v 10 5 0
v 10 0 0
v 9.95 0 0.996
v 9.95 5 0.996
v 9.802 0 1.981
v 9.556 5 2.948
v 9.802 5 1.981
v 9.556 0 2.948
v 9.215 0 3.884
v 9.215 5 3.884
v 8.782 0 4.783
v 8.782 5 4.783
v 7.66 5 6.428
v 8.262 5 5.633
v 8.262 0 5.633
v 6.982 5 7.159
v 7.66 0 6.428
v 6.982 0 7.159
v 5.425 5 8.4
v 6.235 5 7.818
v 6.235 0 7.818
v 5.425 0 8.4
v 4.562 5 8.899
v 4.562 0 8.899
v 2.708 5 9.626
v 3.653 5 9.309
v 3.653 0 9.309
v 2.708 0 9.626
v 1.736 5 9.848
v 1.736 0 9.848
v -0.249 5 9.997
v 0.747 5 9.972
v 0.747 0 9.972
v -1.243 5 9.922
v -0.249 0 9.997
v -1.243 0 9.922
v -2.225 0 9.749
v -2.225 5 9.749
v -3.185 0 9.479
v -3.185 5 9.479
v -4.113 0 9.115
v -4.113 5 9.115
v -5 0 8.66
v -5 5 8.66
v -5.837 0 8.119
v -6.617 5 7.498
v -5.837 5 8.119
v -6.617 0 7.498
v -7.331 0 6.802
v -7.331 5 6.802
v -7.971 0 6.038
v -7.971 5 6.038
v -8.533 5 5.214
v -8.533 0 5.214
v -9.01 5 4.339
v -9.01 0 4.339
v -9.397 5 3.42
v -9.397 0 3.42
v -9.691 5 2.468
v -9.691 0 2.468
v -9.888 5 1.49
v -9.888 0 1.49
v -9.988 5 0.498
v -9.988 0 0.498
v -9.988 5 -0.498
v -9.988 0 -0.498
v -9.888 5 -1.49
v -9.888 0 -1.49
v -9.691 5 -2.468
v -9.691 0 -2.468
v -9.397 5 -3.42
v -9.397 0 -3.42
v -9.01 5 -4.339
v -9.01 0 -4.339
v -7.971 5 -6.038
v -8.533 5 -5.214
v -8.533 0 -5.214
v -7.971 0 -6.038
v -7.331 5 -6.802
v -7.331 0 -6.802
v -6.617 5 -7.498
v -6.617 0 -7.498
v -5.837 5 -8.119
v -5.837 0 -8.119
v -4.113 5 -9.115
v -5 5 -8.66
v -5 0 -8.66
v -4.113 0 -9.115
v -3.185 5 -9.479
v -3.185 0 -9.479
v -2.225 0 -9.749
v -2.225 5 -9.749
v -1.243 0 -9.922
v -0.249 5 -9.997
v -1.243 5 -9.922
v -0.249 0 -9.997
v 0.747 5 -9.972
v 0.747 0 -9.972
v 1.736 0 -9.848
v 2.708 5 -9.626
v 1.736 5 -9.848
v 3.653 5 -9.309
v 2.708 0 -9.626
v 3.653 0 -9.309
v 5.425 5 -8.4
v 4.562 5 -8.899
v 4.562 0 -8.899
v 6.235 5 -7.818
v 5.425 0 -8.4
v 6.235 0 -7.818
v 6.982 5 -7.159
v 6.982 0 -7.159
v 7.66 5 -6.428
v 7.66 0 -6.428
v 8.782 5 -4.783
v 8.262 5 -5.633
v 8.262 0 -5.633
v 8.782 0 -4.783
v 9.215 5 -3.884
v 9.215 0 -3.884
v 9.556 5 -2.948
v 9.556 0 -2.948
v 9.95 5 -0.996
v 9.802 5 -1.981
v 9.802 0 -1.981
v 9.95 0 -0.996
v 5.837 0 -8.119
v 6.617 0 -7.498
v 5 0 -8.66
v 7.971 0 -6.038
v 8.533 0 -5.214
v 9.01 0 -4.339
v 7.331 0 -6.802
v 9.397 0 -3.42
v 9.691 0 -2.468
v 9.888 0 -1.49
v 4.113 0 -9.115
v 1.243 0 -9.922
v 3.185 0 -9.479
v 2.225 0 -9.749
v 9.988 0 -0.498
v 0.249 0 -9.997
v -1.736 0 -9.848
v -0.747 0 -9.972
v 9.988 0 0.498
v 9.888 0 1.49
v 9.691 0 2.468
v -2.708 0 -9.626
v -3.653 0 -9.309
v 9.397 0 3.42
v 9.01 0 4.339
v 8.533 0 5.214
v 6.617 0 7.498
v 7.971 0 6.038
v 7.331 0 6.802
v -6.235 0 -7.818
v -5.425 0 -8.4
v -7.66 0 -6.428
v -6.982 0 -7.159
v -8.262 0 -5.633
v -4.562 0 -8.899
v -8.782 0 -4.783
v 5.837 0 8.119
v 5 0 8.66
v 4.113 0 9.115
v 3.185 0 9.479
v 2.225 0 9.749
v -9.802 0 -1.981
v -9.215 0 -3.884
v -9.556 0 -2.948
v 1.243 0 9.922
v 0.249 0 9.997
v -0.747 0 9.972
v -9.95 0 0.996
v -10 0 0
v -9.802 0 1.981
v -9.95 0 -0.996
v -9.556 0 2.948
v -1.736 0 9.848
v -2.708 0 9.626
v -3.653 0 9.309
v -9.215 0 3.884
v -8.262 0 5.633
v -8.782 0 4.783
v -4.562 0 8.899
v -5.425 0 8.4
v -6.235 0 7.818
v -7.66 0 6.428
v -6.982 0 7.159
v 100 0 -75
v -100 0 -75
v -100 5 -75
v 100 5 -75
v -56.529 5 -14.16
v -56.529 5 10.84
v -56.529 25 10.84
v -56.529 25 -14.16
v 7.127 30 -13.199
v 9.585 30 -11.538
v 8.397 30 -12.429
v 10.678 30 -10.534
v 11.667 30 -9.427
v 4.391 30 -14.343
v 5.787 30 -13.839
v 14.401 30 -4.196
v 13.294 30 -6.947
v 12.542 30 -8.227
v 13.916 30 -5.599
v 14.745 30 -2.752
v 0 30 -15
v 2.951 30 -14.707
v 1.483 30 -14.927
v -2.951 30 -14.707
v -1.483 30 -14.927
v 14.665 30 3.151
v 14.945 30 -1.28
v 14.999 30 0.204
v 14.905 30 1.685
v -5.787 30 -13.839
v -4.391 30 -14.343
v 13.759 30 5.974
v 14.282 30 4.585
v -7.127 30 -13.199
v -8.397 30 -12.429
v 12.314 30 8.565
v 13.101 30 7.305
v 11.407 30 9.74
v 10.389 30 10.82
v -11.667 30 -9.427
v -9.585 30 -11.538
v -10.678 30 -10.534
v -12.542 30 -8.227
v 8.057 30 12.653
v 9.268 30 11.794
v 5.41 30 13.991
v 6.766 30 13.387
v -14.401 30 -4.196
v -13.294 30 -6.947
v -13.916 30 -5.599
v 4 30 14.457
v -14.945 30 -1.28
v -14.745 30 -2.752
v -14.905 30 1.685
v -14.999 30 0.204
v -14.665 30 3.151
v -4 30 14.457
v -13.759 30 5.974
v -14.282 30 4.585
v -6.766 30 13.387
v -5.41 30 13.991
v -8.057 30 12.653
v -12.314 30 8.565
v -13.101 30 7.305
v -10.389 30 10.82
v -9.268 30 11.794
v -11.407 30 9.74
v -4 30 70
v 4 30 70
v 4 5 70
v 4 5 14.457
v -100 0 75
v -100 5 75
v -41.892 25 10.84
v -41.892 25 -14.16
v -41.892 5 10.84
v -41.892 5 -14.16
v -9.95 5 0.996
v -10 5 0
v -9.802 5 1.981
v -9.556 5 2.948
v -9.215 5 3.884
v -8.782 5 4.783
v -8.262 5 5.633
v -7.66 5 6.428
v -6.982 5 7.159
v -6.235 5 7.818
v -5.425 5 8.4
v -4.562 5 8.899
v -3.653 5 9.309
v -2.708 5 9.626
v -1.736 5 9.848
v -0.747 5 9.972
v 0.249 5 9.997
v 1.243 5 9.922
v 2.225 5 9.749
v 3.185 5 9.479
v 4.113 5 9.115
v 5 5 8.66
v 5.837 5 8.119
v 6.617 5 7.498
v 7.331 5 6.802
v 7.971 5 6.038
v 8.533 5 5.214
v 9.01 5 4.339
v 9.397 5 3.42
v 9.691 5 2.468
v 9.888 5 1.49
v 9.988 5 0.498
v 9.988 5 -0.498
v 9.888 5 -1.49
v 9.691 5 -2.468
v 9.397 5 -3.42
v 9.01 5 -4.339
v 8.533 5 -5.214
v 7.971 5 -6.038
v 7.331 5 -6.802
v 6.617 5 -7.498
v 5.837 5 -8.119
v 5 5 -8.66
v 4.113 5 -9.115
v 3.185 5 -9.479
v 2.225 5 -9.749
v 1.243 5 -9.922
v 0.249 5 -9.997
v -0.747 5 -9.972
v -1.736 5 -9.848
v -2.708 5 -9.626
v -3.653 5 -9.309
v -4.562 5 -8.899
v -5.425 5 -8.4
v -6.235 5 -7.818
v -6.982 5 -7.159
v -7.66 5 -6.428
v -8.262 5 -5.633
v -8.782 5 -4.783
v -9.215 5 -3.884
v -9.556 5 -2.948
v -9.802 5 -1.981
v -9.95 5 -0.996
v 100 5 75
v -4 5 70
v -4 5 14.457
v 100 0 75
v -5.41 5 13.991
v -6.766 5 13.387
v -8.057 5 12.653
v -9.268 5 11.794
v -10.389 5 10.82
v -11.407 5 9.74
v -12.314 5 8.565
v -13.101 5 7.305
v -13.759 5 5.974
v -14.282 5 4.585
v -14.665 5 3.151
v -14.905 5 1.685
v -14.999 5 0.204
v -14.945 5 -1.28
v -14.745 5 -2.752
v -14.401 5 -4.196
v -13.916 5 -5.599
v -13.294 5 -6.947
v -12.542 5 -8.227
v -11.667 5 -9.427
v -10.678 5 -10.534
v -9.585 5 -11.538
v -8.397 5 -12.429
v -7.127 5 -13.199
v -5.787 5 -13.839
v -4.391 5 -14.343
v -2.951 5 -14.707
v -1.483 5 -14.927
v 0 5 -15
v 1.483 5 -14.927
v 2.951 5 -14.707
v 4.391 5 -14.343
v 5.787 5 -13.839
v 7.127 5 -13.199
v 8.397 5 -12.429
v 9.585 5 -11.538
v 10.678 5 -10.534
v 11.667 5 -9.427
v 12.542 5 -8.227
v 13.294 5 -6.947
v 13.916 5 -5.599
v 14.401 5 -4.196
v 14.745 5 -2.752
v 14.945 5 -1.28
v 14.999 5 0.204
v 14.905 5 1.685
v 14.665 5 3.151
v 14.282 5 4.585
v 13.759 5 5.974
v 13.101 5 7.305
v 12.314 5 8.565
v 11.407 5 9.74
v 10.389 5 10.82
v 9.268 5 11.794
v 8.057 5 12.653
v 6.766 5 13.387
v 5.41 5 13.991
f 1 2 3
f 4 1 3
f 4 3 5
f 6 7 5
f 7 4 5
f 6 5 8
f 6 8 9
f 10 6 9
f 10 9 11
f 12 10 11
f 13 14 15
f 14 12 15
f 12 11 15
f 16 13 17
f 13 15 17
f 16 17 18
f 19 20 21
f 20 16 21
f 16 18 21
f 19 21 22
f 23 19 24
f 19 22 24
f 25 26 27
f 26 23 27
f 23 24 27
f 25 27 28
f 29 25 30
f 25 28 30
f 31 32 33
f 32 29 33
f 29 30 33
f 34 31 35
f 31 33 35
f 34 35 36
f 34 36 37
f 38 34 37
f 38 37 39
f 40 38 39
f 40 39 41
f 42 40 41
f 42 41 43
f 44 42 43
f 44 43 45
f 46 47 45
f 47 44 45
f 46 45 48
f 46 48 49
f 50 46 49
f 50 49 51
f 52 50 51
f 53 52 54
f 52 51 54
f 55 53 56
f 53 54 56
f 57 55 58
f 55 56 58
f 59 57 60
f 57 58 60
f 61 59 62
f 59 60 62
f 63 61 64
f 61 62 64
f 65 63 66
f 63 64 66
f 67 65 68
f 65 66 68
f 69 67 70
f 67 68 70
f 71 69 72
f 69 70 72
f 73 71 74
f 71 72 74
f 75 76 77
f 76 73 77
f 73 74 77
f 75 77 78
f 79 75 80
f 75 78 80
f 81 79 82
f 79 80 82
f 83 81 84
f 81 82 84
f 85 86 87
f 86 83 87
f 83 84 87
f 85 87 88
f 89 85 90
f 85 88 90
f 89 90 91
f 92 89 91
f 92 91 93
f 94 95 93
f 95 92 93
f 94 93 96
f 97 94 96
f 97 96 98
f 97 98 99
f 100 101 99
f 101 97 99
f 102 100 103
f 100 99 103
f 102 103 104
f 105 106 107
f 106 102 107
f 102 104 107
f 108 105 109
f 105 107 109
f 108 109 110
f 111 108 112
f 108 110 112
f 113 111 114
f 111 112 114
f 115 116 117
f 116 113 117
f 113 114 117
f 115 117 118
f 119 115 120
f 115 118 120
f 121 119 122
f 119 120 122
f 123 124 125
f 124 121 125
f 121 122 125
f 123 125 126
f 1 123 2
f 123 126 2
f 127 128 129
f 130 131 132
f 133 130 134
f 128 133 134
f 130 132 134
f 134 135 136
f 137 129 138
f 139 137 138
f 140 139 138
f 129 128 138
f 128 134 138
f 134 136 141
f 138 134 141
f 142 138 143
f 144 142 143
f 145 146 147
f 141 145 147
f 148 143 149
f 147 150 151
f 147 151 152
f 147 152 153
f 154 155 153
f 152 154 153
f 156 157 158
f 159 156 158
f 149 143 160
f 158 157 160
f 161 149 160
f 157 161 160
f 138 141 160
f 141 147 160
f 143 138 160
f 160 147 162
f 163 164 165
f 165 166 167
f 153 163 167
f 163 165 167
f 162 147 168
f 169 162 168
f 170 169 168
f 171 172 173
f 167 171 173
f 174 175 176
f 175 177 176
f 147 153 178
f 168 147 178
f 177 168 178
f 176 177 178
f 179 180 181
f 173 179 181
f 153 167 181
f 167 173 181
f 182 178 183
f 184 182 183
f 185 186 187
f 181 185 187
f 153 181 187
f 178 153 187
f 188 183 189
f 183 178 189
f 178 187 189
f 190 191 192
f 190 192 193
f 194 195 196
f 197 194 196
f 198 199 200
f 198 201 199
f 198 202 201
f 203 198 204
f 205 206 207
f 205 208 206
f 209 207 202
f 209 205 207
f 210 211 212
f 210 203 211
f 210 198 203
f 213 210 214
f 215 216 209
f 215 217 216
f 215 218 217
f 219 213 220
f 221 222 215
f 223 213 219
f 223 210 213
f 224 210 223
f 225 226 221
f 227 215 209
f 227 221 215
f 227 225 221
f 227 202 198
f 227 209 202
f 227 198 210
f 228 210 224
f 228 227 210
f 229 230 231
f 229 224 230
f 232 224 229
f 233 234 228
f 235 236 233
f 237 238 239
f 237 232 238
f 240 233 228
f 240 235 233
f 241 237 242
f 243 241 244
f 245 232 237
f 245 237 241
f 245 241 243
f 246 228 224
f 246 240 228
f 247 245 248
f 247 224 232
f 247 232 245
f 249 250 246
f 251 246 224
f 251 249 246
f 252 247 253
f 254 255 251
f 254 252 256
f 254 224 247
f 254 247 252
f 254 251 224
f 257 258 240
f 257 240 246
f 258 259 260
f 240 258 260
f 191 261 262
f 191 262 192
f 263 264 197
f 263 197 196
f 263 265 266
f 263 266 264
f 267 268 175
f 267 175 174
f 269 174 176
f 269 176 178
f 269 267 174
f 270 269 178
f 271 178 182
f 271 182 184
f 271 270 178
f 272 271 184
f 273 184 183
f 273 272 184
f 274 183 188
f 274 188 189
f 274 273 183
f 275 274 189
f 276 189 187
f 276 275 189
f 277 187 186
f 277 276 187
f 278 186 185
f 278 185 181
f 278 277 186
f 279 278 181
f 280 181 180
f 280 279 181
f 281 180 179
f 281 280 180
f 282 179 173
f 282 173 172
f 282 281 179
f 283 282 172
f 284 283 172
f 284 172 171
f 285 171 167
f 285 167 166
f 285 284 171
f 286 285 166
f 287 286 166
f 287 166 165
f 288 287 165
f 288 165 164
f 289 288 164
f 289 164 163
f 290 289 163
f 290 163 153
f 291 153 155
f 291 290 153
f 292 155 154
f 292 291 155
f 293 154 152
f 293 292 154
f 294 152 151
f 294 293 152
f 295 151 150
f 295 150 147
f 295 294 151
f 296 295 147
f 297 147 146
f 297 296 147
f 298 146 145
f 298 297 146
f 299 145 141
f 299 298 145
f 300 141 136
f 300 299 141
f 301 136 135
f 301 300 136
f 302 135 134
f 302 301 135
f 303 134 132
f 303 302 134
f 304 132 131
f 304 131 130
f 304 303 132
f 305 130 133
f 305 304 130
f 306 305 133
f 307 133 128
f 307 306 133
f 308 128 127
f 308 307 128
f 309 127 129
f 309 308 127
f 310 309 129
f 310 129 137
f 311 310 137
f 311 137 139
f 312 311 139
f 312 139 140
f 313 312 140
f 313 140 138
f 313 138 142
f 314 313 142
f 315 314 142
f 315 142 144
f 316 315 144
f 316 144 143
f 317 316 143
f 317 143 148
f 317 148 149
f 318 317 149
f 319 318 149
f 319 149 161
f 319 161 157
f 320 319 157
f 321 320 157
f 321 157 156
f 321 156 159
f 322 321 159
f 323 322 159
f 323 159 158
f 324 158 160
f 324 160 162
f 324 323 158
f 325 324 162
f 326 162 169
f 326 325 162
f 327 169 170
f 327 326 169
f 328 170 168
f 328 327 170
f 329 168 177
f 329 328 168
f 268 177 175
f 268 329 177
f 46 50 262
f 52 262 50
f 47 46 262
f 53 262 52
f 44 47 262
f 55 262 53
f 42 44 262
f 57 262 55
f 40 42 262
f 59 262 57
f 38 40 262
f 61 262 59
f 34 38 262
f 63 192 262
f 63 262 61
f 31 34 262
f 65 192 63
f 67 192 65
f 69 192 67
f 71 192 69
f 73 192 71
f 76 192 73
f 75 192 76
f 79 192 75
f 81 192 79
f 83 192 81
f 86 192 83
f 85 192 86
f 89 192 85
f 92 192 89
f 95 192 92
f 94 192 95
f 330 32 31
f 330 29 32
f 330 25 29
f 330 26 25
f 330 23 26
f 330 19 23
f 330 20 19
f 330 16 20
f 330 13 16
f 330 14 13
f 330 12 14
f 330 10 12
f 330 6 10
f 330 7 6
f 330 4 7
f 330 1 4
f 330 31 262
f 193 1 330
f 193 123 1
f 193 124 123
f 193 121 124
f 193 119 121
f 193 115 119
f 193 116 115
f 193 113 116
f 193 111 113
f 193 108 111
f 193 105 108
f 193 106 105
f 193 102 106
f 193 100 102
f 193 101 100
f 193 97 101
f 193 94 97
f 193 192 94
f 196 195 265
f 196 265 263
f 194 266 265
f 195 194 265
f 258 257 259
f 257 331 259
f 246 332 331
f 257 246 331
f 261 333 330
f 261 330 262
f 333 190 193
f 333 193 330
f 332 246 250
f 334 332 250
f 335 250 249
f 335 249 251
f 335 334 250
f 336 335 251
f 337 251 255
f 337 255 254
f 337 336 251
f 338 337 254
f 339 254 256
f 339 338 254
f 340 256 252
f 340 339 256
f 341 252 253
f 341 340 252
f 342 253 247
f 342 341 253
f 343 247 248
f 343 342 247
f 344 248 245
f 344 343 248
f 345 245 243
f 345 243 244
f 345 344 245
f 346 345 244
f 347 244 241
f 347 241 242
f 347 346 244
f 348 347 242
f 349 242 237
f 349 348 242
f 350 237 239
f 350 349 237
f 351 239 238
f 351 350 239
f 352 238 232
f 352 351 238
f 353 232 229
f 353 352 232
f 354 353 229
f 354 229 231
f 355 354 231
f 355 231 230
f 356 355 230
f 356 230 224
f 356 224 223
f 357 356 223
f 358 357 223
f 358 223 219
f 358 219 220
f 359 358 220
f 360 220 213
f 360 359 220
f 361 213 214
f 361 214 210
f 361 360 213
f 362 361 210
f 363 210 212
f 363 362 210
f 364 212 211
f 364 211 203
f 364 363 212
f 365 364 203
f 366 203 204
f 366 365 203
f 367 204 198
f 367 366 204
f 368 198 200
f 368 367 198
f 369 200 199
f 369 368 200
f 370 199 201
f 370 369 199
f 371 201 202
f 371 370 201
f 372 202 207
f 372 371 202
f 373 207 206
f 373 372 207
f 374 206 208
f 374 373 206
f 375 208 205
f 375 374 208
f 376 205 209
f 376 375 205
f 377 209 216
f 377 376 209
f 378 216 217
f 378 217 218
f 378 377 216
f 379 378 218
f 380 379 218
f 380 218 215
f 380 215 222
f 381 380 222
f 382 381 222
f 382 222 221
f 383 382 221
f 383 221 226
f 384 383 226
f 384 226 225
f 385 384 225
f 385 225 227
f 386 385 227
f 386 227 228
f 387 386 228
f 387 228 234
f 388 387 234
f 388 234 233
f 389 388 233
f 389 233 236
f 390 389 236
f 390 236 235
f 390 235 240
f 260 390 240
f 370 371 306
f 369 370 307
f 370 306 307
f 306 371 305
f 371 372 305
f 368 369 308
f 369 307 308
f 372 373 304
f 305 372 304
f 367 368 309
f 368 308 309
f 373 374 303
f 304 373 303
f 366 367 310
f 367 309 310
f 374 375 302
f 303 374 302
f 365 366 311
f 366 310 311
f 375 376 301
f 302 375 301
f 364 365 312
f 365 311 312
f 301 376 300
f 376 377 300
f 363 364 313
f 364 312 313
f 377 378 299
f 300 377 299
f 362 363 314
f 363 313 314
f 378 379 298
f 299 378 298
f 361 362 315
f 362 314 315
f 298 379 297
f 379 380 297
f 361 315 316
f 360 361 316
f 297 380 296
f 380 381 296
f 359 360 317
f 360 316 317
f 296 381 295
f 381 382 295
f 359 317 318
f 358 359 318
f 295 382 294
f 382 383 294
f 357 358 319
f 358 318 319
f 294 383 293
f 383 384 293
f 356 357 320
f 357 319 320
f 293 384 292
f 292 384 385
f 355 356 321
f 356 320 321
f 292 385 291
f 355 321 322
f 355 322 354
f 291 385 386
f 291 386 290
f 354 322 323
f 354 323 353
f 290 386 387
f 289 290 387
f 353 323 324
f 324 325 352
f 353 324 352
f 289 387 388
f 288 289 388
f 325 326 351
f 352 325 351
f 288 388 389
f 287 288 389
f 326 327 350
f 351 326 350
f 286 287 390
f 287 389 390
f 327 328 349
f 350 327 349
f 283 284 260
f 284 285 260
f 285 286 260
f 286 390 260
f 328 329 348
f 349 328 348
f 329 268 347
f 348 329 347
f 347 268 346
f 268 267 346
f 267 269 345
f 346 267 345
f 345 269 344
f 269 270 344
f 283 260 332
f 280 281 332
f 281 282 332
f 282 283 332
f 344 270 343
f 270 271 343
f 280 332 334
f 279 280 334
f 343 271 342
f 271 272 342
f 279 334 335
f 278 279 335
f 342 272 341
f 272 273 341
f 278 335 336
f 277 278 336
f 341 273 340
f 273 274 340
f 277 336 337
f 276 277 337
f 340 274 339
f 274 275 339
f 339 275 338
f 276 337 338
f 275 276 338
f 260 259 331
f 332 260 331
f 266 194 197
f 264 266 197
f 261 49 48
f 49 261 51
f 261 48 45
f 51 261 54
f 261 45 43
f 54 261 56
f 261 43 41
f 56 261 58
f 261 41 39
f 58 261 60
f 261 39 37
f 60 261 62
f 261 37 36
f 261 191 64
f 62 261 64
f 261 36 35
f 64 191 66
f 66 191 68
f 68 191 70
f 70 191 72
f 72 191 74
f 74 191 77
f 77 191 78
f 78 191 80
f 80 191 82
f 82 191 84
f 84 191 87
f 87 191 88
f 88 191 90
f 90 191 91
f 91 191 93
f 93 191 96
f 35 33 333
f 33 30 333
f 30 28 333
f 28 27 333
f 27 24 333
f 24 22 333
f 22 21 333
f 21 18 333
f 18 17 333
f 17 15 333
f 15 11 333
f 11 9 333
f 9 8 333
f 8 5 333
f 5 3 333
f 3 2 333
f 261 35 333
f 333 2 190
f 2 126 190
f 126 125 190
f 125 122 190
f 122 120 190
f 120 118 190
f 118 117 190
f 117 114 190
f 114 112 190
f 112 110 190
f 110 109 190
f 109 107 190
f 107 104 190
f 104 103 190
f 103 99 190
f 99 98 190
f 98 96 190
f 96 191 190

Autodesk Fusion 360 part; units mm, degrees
sketch "Sketch1" plane through (0, 0, 0) normal (0, 1, 0) x (1, 0, 0)
  line L0 (100, -75) -> (-100, -75)
  line L1 (-100, -75) -> (-100, 75)
  line L2 (-100, 75) -> (100, 75)
  line L3 (100, 75) -> (100, -75)
  line L4 (100, -75) -> (-100, 75) construction
  line L5 (-100, -75) -> (100, 75) construction
  circle A0 centre (0, 0) radius 10
  dimension "d1" = 200
  dimension "d2" = 150
  dimension "d3" = 20
extrude "Extrude1" add sketch "Sketch1" along normal blind 5 makes body 1
sketch "Sketch1 (2)" plane through (0, 5, 0) normal (0, 1, 0) x (-1, 0, 0) in component "Paddle"
  circle A0 centre (0, 0) radius 10
  line L0 (-100, -75) -> (100, -75)
  line L1 (100, -75) -> (100, 75)
  line L2 (100, 75) -> (-100, 75)
  line L3 (-100, 75) -> (-100, -75)
  circle A1 centre (0, 0) radius 10
  circle A2 centre (0, 0) radius 15
  line L4 (4, 14.4568) -> (4, 70)
  line L5 (4, 70) -> (-4, 70)
  line L6 (-4, 70) -> (-4, 14.4568)
  dimension "d6" = 20
  dimension "d7" = 30
  dimension "d8" = 4
  dimension "d9" = 8
  dimension "d10" = 70
extrude "Extrude1'" add sketch "Sketch1 (2)" against normal blind 5 separate body contours A0 A1 makes body 2 in component "Paddle"
extrude "Extrude2" add sketch "Sketch1 (2)" along normal blind 25 contours A0 A1 | A2 | A2 L4 L5 L6 bodies 2 in component "Paddle"
box "BoxPrimitive1" add length 25 width 14.6371 height 20 placed x (0, 0, 1) y (1, 0, 0) z (0, 1, 0) at (-56.5289, 5, -14.1597) separate body makes body 3 in component "Block"
component "Paddle" placed x (1, 0, 0) y (0, 1, 0) z (0, 0, 1) at (0, 0, 0)
component "Block" placed x (1, 0, 0) y (0, 1, 0) z (0, 0, 1) at (0, 0, 0)
